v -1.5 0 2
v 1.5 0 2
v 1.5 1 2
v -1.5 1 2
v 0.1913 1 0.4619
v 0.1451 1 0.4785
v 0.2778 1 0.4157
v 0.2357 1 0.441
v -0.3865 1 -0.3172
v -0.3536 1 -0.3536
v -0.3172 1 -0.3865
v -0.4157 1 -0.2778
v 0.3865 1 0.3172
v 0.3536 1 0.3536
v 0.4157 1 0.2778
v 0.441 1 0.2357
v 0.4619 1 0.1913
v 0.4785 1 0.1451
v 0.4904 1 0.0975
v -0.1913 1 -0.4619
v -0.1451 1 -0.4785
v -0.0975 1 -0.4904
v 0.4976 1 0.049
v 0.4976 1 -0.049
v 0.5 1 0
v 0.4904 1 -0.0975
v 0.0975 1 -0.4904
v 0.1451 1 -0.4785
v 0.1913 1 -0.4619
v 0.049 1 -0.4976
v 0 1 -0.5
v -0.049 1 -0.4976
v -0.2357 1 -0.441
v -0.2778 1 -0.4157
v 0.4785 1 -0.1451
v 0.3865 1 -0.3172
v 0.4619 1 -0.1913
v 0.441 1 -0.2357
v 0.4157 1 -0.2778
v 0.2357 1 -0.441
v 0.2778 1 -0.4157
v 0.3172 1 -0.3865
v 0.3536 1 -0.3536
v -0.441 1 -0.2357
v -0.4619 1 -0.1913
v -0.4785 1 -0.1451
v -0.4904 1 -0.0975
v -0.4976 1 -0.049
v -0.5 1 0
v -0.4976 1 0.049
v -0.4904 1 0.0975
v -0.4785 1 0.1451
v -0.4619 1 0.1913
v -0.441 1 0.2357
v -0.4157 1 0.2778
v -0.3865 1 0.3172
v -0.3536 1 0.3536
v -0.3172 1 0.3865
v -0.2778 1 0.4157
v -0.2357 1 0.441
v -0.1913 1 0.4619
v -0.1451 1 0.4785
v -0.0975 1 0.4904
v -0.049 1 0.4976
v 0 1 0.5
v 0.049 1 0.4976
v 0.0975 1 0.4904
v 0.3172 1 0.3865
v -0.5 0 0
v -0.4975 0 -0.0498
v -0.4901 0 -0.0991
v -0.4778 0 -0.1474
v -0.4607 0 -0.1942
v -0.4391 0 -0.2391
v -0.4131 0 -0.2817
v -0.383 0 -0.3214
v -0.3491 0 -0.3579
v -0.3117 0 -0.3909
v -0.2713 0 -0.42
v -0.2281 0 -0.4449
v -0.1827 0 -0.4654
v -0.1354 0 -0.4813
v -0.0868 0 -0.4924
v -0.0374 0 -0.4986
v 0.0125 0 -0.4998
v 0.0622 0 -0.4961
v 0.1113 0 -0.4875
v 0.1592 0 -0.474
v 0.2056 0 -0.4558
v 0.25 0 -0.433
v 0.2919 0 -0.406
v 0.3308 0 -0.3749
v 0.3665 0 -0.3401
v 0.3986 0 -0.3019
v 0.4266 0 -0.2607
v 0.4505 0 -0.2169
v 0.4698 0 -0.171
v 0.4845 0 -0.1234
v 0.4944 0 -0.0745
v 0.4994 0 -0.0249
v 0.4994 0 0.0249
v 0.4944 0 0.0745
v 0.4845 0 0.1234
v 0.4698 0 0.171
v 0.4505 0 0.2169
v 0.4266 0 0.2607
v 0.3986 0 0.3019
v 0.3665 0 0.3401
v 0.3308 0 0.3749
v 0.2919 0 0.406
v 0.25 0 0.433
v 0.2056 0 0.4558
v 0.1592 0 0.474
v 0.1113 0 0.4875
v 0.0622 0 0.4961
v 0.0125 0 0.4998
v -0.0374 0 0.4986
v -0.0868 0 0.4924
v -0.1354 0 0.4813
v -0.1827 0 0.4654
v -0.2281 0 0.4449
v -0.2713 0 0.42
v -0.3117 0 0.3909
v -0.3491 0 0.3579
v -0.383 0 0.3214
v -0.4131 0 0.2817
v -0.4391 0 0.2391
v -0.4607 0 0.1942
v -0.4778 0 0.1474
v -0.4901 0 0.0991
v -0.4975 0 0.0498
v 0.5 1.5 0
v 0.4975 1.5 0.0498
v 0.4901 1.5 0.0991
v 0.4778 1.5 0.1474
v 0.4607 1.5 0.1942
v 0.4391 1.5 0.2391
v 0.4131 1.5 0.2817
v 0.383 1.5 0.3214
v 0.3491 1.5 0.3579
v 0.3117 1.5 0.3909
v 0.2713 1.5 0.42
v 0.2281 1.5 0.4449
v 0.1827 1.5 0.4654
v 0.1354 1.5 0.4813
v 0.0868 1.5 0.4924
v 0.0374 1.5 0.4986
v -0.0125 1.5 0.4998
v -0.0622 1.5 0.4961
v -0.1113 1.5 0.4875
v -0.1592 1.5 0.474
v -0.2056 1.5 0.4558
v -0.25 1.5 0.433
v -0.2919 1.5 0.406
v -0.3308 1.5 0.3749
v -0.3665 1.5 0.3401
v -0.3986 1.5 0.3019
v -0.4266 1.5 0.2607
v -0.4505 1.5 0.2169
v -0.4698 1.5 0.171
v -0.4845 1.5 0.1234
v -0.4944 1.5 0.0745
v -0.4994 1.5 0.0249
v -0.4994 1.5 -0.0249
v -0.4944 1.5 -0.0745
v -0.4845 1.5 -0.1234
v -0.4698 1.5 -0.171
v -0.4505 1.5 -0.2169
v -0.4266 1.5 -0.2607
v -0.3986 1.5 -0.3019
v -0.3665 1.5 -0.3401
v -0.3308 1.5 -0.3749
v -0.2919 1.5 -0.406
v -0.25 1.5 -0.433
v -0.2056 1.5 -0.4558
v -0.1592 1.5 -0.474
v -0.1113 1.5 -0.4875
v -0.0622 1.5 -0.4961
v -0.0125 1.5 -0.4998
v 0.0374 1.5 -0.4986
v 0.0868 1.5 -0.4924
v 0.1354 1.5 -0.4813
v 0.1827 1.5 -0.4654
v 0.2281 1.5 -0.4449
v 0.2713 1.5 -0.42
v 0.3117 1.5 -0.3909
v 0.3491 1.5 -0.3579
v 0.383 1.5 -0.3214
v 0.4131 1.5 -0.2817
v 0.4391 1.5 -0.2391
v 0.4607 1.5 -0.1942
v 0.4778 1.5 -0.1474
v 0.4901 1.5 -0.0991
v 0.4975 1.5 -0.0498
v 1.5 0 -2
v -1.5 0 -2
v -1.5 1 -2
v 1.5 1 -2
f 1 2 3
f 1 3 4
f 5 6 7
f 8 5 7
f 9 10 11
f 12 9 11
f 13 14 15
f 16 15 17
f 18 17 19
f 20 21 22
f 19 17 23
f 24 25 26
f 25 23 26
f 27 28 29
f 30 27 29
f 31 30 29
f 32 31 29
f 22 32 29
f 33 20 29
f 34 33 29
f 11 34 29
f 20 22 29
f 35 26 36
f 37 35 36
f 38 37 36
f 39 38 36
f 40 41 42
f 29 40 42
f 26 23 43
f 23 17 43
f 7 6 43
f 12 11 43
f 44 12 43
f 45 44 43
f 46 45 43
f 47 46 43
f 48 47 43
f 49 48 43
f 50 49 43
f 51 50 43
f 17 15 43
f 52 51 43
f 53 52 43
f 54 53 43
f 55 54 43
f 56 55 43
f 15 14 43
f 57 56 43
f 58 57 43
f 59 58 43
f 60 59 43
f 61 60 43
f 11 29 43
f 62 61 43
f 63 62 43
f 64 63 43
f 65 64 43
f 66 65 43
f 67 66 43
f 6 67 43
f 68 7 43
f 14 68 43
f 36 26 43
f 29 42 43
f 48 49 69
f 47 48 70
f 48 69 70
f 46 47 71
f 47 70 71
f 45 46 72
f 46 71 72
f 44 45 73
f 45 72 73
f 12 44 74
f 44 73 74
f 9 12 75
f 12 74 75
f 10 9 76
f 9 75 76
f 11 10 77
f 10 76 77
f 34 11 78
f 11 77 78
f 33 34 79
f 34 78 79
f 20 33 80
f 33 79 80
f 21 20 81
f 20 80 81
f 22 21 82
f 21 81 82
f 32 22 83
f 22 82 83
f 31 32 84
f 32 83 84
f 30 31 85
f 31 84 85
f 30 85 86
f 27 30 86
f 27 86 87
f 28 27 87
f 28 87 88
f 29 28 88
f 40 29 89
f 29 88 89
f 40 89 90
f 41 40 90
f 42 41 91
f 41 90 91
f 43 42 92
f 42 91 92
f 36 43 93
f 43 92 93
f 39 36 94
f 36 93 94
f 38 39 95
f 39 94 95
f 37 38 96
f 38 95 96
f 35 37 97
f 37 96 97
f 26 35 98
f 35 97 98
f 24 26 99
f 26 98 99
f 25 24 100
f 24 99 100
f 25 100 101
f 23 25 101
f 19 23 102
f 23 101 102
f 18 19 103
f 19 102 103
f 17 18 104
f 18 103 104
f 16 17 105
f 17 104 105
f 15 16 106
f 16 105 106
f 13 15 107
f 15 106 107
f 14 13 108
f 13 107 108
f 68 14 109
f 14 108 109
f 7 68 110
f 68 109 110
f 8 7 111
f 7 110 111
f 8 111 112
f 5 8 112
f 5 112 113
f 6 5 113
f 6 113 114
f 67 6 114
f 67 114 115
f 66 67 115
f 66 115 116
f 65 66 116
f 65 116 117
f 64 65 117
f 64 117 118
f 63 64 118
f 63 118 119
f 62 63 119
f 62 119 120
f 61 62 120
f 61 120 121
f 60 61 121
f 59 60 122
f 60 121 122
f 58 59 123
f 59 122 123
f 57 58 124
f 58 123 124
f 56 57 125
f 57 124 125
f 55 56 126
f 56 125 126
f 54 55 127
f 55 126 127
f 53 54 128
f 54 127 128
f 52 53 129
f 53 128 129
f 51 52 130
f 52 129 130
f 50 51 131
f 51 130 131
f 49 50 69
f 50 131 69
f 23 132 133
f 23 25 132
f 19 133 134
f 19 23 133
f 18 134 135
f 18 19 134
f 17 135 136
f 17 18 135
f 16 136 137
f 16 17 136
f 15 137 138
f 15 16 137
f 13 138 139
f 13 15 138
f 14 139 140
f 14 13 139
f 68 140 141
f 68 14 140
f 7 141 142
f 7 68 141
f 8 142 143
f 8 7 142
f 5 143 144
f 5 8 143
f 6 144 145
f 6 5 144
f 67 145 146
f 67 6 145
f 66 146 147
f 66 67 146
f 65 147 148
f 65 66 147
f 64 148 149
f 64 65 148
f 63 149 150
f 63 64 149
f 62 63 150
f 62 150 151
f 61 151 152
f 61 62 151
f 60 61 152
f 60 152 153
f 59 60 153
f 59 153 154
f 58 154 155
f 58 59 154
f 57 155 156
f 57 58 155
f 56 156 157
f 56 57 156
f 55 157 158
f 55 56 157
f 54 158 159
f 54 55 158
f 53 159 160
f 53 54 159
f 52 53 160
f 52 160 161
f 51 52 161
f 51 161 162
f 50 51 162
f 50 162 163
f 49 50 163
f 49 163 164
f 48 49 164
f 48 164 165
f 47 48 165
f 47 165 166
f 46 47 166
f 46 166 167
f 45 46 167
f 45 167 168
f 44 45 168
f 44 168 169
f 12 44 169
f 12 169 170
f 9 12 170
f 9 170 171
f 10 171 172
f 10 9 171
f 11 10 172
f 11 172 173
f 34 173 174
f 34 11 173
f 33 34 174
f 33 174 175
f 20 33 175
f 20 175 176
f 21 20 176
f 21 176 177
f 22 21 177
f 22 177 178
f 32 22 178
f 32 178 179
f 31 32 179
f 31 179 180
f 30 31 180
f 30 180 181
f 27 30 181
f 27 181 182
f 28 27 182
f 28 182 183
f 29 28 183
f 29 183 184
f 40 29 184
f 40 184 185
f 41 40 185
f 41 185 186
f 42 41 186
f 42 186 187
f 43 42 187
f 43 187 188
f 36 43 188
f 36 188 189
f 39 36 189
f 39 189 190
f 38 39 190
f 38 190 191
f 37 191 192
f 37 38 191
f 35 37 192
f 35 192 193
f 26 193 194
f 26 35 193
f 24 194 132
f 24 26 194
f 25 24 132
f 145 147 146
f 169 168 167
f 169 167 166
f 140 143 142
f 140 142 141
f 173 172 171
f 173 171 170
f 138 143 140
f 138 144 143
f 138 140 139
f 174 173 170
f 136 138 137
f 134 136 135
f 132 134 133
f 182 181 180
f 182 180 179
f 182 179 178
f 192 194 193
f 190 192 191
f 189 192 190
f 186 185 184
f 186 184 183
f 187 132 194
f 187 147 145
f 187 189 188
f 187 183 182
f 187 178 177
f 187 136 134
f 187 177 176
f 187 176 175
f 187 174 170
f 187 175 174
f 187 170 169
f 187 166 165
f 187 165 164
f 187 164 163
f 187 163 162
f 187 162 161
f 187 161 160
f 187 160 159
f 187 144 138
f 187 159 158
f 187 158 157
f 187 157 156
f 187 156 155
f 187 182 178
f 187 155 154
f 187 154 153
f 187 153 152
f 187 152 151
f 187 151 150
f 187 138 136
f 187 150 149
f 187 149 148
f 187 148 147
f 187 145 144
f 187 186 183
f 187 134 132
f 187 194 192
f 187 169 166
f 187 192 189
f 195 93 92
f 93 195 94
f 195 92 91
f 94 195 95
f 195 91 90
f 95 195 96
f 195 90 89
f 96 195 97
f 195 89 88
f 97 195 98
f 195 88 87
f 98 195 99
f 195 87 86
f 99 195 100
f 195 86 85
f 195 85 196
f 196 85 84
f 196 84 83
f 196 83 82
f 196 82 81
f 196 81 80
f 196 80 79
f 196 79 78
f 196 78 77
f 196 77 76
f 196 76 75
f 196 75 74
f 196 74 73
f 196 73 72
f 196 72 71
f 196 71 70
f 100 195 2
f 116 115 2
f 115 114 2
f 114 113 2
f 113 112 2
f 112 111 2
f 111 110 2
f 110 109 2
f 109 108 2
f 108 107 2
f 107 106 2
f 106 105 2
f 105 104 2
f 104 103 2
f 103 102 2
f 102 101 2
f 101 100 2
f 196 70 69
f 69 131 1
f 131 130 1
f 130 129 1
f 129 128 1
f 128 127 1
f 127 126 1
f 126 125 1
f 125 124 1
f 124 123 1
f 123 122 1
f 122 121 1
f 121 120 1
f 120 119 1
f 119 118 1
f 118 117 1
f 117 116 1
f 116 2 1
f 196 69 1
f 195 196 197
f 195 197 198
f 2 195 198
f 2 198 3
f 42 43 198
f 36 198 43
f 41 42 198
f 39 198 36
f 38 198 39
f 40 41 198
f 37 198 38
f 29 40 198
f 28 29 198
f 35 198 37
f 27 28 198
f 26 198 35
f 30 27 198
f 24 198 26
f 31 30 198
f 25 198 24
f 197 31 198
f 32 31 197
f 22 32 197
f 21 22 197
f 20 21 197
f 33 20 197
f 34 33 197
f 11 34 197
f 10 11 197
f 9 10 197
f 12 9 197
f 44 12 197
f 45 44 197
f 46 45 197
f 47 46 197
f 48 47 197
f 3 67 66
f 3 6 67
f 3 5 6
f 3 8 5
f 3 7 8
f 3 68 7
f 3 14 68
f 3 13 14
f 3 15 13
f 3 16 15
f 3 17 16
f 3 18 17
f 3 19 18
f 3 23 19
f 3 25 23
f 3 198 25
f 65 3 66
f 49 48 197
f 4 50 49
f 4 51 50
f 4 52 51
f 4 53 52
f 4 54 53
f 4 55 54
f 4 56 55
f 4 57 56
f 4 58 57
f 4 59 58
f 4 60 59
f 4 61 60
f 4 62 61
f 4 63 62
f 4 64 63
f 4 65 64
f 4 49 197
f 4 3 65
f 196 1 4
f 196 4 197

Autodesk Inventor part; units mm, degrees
ref_plane "YZ Plane" through (0, 0, 0) normal (1, 0, 0) x (0, 1, 0)
ref_plane "XZ Plane" through (0, 0, 0) normal (0, 1, 0) x (-1, 0, 0)
ref_plane "XY Plane" through (0, 0, 0) normal (0, 0, 1) x (1, 0, 0)
sketch "Sketch1" plane through (0, 0, 0) normal (0, 1, 0) x (-1, 0, 0)
  line L0 (-1.5, 2) -> (1.5, 2)
  line L1 (1.5, 2) -> (1.5, -2)
  line L2 (1.5, -2) -> (-1.5, -2)
  line L3 (-1.5, -2) -> (-1.5, 2)
  line L4 (-1.5, 2) -> (1.5, -2) construction
  line L5 (1.5, 2) -> (-1.5, -2) construction
  circle A0 centre (0, 0) radius 0.5
  dimension "d0" = 3
  dimension "d1" = 4
  dimension "d2" = 1
extrude "Extrusion1" add sketch "Sketch1" along normal blind 1
sketch "Sketch2" plane through (0, 1, 0) normal (0, 1, 0) x (1, 0, 0)
  circle A0 centre (0, 0) radius 0.5
extrude "Extrusion2" add sketch "Sketch2" along normal blind 0.5
properties part number "knop_1"
